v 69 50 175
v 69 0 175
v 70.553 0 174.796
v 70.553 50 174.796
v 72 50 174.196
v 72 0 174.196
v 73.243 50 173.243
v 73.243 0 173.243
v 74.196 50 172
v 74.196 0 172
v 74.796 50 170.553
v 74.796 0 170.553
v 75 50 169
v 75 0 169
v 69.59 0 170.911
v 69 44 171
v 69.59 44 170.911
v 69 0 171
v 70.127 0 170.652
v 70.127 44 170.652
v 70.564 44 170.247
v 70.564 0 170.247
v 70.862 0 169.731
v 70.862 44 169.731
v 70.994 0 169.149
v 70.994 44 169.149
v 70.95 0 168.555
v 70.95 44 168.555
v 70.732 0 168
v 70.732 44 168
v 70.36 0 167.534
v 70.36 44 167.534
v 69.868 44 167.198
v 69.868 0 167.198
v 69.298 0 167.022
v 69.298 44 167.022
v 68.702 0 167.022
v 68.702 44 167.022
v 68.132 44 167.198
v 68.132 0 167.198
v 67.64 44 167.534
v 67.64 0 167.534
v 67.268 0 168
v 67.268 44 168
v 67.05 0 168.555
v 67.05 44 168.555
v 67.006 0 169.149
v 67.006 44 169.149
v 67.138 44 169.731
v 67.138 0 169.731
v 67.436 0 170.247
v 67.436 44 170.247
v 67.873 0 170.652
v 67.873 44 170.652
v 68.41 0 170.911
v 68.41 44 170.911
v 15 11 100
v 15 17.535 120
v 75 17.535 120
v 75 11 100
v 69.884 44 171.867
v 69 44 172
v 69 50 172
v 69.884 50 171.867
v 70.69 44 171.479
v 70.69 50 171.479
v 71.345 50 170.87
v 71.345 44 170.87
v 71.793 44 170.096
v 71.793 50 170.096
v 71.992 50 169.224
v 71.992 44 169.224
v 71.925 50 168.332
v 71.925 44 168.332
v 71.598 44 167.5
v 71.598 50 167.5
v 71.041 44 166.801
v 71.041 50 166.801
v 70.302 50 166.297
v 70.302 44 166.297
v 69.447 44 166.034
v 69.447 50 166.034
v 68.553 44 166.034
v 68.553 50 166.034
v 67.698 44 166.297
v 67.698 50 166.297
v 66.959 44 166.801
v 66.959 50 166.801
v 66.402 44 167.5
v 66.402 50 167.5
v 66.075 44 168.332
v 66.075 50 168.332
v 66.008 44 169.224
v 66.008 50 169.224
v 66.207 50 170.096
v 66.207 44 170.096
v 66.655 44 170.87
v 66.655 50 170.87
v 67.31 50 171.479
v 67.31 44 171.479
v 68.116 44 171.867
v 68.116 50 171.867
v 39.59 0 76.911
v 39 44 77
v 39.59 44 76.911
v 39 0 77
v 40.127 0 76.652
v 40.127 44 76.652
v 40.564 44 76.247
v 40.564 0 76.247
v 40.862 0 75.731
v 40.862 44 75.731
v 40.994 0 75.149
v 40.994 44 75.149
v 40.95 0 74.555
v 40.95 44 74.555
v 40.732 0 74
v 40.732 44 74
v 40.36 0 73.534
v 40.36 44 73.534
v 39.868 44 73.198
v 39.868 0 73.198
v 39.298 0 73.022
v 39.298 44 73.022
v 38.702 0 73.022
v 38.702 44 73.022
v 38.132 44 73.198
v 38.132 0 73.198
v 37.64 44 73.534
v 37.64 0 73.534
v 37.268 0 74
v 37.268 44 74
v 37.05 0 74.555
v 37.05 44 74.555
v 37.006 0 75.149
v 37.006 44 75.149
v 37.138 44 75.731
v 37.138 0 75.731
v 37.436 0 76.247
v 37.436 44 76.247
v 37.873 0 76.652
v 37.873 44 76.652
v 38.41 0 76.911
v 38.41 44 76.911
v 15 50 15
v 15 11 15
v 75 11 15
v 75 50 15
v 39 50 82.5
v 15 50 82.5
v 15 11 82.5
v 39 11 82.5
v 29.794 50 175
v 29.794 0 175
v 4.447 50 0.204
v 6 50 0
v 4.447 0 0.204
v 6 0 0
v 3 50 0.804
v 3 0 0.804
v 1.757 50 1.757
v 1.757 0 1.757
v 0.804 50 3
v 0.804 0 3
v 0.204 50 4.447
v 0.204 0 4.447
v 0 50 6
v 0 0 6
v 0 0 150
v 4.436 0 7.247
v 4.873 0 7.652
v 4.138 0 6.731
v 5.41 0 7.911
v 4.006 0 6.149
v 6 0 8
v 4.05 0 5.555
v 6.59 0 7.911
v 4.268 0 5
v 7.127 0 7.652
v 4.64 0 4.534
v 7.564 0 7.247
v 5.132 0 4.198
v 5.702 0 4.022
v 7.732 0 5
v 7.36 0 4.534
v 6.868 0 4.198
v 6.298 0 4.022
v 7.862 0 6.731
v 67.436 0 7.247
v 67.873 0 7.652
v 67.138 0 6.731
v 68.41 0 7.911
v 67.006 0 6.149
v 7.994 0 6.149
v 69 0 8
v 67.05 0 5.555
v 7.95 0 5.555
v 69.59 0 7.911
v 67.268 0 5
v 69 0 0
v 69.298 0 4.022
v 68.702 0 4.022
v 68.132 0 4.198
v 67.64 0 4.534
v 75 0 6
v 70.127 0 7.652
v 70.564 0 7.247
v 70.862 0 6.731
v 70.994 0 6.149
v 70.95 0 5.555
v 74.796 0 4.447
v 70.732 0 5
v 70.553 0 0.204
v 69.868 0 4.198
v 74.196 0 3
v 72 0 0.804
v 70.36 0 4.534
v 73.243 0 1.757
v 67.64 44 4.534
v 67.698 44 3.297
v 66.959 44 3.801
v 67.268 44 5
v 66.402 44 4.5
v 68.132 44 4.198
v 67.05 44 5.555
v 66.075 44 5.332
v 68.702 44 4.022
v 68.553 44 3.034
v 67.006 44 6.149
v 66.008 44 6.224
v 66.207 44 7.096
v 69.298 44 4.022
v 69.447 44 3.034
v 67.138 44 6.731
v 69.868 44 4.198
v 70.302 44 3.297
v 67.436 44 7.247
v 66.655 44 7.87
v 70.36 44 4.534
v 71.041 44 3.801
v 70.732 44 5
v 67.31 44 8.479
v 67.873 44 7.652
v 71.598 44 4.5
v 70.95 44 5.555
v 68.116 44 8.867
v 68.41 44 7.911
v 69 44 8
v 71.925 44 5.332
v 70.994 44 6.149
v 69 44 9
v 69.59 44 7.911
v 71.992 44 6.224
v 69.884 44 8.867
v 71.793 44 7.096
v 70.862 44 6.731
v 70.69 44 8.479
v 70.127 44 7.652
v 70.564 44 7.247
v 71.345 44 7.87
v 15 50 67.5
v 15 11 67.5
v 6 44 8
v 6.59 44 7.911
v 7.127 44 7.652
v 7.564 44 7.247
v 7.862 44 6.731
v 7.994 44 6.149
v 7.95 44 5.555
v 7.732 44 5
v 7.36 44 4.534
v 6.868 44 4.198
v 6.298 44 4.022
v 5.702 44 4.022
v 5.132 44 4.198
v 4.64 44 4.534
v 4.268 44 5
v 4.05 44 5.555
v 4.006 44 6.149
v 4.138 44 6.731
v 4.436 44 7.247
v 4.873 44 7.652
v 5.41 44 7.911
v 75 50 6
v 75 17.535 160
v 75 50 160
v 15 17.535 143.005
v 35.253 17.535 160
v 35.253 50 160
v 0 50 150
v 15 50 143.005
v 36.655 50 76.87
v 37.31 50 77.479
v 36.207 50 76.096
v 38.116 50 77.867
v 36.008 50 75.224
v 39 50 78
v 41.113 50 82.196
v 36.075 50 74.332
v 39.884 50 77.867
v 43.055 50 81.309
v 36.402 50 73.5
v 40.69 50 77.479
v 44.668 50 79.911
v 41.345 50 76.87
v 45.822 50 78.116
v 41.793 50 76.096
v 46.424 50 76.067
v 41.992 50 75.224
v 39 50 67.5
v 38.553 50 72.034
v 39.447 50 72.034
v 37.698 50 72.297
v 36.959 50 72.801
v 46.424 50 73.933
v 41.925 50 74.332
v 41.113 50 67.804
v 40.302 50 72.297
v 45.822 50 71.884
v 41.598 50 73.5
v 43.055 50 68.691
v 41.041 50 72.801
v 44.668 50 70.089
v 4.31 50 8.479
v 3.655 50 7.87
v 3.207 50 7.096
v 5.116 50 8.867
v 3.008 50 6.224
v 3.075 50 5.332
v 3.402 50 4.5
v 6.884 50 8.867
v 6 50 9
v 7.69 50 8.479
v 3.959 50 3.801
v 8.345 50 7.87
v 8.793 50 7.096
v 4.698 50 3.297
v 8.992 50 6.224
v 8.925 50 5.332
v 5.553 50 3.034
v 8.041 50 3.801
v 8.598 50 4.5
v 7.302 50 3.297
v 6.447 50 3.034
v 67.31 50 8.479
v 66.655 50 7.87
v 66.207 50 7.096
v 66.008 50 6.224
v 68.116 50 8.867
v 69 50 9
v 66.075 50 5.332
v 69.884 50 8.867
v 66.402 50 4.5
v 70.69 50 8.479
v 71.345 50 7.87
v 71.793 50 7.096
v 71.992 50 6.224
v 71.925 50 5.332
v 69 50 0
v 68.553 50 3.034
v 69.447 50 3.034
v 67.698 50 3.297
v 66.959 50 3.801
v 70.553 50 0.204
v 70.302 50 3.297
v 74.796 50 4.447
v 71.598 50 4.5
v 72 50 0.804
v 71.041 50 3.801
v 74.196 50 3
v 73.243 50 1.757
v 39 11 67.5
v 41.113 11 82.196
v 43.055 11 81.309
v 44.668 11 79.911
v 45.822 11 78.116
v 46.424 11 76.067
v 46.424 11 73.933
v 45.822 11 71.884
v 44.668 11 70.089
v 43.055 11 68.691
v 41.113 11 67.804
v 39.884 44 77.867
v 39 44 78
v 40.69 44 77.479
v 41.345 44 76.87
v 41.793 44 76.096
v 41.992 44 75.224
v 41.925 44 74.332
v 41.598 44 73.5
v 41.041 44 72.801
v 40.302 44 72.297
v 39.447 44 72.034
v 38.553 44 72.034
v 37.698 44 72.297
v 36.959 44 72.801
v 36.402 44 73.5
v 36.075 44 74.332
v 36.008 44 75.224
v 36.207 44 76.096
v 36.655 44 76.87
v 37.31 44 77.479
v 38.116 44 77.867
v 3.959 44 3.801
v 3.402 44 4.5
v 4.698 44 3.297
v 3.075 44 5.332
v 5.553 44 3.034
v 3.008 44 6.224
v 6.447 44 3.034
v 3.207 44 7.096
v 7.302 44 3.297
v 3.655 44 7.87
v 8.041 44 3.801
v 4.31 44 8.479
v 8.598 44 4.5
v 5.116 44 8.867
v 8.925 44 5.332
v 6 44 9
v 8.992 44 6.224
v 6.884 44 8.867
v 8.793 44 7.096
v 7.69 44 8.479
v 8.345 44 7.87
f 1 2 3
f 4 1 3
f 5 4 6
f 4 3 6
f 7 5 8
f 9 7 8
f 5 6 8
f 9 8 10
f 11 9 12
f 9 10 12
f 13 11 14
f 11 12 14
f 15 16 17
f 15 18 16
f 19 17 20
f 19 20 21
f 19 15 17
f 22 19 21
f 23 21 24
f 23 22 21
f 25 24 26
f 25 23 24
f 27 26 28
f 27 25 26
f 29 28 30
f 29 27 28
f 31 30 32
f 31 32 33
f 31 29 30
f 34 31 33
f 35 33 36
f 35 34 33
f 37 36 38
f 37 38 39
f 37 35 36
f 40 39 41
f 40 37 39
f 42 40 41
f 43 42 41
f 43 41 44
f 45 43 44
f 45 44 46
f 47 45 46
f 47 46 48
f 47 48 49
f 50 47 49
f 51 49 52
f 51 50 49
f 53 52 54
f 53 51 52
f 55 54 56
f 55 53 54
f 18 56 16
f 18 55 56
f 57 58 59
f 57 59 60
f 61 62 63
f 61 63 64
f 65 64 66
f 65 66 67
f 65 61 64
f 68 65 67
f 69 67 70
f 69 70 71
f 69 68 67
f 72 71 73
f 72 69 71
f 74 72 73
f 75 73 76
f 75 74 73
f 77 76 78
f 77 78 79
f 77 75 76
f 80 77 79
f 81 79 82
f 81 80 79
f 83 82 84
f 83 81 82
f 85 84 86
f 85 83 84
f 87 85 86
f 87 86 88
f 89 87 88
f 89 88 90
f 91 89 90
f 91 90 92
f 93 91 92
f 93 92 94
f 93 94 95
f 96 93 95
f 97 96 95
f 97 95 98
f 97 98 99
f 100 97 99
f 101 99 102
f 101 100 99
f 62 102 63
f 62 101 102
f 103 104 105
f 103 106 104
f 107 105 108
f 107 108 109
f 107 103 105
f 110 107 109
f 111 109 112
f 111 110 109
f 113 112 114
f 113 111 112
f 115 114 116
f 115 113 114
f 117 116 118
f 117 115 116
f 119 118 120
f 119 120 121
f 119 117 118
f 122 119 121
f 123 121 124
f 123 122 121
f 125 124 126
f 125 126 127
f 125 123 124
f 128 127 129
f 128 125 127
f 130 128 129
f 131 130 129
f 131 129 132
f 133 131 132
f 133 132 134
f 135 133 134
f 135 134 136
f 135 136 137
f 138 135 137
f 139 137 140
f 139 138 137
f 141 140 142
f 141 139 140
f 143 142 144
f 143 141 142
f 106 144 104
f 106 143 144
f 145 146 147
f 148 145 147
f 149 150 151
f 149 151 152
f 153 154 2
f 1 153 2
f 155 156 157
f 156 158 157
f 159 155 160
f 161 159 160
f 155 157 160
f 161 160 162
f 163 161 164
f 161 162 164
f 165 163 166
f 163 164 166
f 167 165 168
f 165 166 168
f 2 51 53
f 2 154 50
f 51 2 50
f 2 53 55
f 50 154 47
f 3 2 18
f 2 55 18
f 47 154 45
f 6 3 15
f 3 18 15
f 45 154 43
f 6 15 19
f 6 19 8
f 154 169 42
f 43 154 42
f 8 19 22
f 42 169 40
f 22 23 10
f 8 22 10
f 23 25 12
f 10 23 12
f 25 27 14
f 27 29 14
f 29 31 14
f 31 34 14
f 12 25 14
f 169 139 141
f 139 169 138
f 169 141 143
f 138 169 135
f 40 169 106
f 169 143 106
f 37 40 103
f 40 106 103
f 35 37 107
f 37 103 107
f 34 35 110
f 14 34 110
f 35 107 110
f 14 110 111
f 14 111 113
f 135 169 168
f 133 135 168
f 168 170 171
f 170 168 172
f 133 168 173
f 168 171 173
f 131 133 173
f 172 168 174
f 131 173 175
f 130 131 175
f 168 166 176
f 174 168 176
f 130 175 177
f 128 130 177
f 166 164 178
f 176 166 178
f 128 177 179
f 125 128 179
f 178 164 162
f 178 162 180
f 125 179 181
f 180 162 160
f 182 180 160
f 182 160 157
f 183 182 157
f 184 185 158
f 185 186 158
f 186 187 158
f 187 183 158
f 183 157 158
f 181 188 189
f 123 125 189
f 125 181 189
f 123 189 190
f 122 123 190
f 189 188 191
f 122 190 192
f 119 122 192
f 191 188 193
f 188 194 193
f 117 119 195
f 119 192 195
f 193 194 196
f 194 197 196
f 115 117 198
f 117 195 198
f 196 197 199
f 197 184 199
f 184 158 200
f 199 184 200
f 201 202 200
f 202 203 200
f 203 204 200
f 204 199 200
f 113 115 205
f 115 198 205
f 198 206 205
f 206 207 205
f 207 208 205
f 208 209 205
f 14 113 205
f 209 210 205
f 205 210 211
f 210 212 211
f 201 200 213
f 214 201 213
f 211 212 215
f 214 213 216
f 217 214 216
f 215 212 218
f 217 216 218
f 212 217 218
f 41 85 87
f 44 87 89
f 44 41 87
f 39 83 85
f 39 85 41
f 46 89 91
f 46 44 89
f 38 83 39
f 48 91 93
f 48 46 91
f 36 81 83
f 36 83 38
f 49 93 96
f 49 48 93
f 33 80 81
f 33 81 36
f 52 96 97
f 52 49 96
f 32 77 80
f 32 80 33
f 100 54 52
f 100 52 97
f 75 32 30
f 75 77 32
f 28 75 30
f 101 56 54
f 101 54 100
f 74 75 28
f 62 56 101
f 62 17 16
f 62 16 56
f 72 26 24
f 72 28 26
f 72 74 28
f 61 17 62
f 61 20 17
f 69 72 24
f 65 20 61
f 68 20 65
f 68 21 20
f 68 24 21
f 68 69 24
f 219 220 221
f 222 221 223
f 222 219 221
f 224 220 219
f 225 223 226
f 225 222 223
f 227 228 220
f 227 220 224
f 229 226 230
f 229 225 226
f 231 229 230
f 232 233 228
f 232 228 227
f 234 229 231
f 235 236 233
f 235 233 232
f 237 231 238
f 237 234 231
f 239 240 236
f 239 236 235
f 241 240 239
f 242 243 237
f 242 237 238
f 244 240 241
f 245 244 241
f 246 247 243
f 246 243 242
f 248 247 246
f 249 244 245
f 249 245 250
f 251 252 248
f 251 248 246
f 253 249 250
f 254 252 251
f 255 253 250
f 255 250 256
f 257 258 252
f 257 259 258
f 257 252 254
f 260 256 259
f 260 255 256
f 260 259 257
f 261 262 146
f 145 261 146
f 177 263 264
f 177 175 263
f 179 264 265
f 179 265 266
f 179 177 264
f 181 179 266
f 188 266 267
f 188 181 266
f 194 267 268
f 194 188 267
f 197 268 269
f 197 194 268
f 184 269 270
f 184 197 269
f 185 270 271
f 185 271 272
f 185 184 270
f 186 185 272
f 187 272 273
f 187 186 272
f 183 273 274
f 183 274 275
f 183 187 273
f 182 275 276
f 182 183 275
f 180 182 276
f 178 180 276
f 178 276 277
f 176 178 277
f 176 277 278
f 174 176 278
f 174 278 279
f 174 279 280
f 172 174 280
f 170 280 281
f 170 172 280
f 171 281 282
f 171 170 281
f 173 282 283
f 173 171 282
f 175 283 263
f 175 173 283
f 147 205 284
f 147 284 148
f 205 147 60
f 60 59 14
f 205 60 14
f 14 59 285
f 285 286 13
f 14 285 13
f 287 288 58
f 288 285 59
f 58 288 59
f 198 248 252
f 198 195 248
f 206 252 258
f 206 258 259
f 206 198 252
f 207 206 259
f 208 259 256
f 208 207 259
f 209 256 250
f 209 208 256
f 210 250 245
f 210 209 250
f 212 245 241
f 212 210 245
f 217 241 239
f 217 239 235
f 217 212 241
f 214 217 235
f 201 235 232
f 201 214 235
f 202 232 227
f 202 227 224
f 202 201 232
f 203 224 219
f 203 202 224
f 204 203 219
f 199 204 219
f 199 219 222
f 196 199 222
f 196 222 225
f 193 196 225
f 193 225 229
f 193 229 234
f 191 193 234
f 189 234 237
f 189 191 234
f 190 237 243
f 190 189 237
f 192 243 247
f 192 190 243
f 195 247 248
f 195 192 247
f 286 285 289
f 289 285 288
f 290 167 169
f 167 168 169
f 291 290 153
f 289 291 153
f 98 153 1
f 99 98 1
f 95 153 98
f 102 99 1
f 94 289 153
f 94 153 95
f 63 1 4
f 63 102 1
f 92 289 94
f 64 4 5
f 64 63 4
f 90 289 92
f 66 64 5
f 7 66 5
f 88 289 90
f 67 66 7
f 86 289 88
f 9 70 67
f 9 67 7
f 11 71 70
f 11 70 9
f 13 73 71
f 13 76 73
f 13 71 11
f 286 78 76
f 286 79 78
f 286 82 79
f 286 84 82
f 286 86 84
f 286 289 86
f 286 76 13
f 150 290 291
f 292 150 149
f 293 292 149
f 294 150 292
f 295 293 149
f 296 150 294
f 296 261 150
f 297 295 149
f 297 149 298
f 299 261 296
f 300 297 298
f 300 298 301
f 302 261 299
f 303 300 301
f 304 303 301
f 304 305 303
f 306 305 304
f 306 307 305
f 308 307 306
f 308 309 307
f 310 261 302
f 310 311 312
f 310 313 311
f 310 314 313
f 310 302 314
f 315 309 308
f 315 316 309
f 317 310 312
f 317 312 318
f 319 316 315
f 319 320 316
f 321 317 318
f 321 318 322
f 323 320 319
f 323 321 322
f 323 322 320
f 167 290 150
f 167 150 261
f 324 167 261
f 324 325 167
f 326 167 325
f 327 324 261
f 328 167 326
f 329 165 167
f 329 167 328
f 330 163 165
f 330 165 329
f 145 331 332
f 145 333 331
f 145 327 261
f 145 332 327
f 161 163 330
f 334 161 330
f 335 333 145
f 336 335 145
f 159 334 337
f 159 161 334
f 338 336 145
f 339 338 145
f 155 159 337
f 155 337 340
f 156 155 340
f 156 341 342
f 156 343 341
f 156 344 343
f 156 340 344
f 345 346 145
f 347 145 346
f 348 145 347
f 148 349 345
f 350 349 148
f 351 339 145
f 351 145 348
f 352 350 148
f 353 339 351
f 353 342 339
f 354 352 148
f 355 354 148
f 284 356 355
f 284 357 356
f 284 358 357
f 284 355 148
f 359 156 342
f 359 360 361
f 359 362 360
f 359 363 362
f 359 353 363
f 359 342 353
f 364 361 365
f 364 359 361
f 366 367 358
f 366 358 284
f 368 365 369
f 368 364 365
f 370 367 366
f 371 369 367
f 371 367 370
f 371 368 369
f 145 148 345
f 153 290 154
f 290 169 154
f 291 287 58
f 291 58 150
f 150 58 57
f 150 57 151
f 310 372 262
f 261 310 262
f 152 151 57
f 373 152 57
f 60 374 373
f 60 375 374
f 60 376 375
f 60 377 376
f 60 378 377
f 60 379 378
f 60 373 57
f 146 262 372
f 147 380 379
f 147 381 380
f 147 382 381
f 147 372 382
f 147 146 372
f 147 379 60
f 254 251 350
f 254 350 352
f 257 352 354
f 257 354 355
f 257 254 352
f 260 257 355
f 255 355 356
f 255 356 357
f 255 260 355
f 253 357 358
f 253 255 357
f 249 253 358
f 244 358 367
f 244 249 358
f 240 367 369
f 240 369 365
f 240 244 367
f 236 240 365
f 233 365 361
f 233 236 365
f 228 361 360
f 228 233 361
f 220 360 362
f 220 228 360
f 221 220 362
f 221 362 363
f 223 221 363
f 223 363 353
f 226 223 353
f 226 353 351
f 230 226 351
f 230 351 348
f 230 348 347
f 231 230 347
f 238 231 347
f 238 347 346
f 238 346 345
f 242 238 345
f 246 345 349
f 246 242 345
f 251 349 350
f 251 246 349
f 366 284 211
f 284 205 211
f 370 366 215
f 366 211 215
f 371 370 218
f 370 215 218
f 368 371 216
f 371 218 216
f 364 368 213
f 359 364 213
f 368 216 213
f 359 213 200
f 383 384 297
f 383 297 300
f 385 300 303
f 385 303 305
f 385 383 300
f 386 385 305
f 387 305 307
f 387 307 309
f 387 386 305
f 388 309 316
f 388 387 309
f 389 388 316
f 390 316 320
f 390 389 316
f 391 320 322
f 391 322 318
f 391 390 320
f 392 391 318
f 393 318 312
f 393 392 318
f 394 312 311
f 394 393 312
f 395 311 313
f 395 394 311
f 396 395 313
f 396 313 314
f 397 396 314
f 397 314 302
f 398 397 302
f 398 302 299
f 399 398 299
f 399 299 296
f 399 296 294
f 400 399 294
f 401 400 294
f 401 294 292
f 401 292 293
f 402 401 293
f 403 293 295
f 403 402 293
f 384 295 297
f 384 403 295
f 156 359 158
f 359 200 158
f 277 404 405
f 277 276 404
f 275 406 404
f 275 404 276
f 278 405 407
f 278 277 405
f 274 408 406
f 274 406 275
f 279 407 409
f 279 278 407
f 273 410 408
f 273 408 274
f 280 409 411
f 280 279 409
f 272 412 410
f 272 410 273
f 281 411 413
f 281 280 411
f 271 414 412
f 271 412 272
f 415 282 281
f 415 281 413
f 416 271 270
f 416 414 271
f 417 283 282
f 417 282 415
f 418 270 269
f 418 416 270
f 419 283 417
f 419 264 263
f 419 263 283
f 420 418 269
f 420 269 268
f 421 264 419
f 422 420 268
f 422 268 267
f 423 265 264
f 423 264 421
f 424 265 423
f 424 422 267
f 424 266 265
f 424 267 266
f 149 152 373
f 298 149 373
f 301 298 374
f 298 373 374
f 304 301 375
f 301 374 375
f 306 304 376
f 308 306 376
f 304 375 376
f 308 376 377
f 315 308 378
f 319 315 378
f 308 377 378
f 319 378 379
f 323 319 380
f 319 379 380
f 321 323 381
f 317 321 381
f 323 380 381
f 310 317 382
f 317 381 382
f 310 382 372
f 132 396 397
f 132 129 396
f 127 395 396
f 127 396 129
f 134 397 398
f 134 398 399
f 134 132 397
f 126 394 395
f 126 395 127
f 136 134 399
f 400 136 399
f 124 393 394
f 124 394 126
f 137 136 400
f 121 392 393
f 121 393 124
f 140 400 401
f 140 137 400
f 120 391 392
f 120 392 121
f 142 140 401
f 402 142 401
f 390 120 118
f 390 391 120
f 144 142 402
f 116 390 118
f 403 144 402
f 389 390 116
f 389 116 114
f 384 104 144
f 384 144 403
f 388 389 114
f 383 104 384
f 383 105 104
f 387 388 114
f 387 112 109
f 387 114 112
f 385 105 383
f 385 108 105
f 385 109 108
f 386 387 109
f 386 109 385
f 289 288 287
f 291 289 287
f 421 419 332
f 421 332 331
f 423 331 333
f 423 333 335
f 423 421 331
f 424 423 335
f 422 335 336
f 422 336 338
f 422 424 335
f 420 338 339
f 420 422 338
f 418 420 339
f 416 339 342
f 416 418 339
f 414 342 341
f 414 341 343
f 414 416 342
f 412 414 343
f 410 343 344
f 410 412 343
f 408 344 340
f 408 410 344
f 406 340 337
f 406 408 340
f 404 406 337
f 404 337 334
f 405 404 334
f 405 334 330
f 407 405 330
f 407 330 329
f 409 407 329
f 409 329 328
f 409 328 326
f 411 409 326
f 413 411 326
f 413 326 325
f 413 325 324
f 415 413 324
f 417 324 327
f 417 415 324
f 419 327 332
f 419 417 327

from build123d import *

# Parameters (mm, degrees)
SKETCH2_R           = 2
BOSS_EXTRUDE1_DEPTH = 11
SKETCH3_R           = 2
BOSS_EXTRUDE2_DEPTH = 39
EXTRUDE_THIN1_REACH = 198.85
CUT_EXTRUDE2_START  = -6
SKETCH5_R           = 3
SKETCH5_R_2         = 2
CUT_EXTRUDE2_DEPTH  = 6


with BuildPart() as part:
    # Sketch2 → Boss-Extrude1 (new body)
    with BuildSketch(Plane(origin=(0, 0, 0), x_dir=(1, 0, 0), z_dir=(0, 1, 0))):
        with BuildLine():
            Line((0, -150), (29.793839815, -175))
            Line((29.793839815, -175), (69, -175))
            ThreePointArc((69, -175), (73.242640687, -173.242640687), (75, -169))
            Line((75, -169), (75, -6))
            ThreePointArc((75, -6), (73.242640687, -1.757359313), (69, 0))
            Line((69, 0), (6, 0))
            ThreePointArc((6, 0), (1.757359313, -1.757359313), (0, -6))
            Line((0, -6), (0, -150))
        make_face()
        with Locations(Location((69, -169, 0), (0, 0, 270))):
            Circle(SKETCH2_R, mode=Mode.SUBTRACT)
        with Locations(Location((69, -6, 0), (0, 0, 270))):
            Circle(SKETCH2_R, mode=Mode.SUBTRACT)
        with Locations(Location((6, -6, 0), (0, 0, 270))):
            Circle(SKETCH2_R, mode=Mode.SUBTRACT)
        with Locations(Location((39, -75, 0), (0, 0, 270))):
            Circle(SKETCH2_R, mode=Mode.SUBTRACT)
    extrude(amount=BOSS_EXTRUDE1_DEPTH)

    # Sketch3 → Boss-Extrude2 (add)
    with BuildSketch(Plane(origin=(0, 11, 0), x_dir=(1, 0, 0), z_dir=(0, 1, 0))):
        with BuildLine():
            Line((39, -67.5), (15, -67.5))
            Line((15, -67.5), (15, -15))
            Line((15, -15), (75, -15))
            Line((75, -15), (75, -6))
            ThreePointArc((75, -6), (73.242640687, -1.757359313), (69, 0))
            Line((69, 0), (6, 0))
            ThreePointArc((6, 0), (1.757359313, -1.757359313), (0, -6))
            Line((0, -6), (0, -150))
            Line((0, -150), (29.793839815, -175))
            Line((29.793839815, -175), (69, -175))
            ThreePointArc((69, -175), (73.242640687, -173.242640687), (75, -169))
            Line((75, -169), (75, -160))
            Line((75, -160), (35.253393329, -160))
            Line((35.253393329, -160), (15, -143.005385128))
            Line((15, -143.005385128), (15, -82.5))
            Line((15, -82.5), (39, -82.5))
            ThreePointArc((39, -82.5), (46.5, -75), (39, -67.5))
        make_face()
        with Locations(Location((69, -169, 0), (0, 0, 270))):
            Circle(SKETCH3_R, mode=Mode.SUBTRACT)
        with Locations(Location((6, -6, 0), (0, 0, 270))):
            Circle(SKETCH3_R, mode=Mode.SUBTRACT)
        with Locations(Location((39, -75, 0), (0, 0, 270))):
            Circle(SKETCH3_R, mode=Mode.SUBTRACT)
        with Locations(Location((69, -6, 0), (0, 0, 270))):
            Circle(SKETCH3_R, mode=Mode.SUBTRACT)
    extrude(amount=BOSS_EXTRUDE2_DEPTH)

    # Sketch4 → Extrude-Thin1 (add, up to next)
    with BuildSketch(Plane(origin=(75, 0, 0), x_dir=(0, 0, -1), z_dir=(1, 0, 0)), mode=Mode.PRIVATE) as extrude_thin1_sk1:
        Polygon((-160, 17.535298339), (-120, 17.535298339), (-100, 11), (-103.106030321, 1.494602815), (-121.592395321, 7.535298339), (-160, 7.535298339), align=None)
    extrude_thin1_tool1 = extrude(extrude_thin1_sk1.sketch, amount=-EXTRUDE_THIN1_REACH, mode=Mode.PRIVATE) - part.part
    add(extrude_thin1_tool1.solids().sort_by_distance((75, 11.508735, 130.439328))[0])

    # Sketch5 → Cut-Extrude2 (cut)
    # profile 1 of 5: a face of its own
    with BuildSketch(Plane(origin=(0, 50, 0), x_dir=(1, 0, 0), z_dir=(0, 1, 0)).offset(CUT_EXTRUDE2_START)):
        with Locations(Location((69, -6, 0), (0, 0, 270))):
            Circle(SKETCH5_R)
        with Locations(Location((69, -6, 0), (0, 0, 270))):
            Circle(SKETCH5_R_2, mode=Mode.SUBTRACT)
    # profile 2 of 5: a face of its own
    with BuildSketch(Plane(origin=(0, 50, 0), x_dir=(1, 0, 0), z_dir=(0, 1, 0)).offset(CUT_EXTRUDE2_START)):
        with Locations(Location((6, -6, 0), (0, 0, 270))):
            Circle(SKETCH5_R)
        with Locations(Location((6, -6, 0), (0, 0, 270))):
            Circle(SKETCH5_R_2, mode=Mode.SUBTRACT)
    # profile 3 of 5: a face of its own
    with BuildSketch(Plane(origin=(0, 50, 0), x_dir=(1, 0, 0), z_dir=(0, 1, 0)).offset(CUT_EXTRUDE2_START)):
        with Locations(Location((39, -75, 0), (0, 0, 270))):
            Circle(SKETCH5_R)
        with Locations(Location((39, -75, 0), (0, 0, 270))):
            Circle(SKETCH5_R_2, mode=Mode.SUBTRACT)
    # profile 4 of 5: a face of its own
    with BuildSketch(Plane(origin=(0, 50, 0), x_dir=(1, 0, 0), z_dir=(0, 1, 0)).offset(CUT_EXTRUDE2_START)):
        with Locations(Location((69, -169, 0), (0, 0, 270))):
            Circle(SKETCH5_R)
        with Locations(Location((69, -169, 0), (0, 0, 270))):
            Circle(SKETCH5_R_2, mode=Mode.SUBTRACT)
    # profile 5 of 5: a face of its own
    with BuildSketch(Plane(origin=(0, 50, 0), x_dir=(1, 0, 0), z_dir=(0, 1, 0)).offset(CUT_EXTRUDE2_START)):
        with Locations(Location((69, -6, 0), (0, 0, 270))):
            Circle(SKETCH5_R_2)
    extrude(amount=CUT_EXTRUDE2_DEPTH, mode=Mode.SUBTRACT)


solid = part.part
